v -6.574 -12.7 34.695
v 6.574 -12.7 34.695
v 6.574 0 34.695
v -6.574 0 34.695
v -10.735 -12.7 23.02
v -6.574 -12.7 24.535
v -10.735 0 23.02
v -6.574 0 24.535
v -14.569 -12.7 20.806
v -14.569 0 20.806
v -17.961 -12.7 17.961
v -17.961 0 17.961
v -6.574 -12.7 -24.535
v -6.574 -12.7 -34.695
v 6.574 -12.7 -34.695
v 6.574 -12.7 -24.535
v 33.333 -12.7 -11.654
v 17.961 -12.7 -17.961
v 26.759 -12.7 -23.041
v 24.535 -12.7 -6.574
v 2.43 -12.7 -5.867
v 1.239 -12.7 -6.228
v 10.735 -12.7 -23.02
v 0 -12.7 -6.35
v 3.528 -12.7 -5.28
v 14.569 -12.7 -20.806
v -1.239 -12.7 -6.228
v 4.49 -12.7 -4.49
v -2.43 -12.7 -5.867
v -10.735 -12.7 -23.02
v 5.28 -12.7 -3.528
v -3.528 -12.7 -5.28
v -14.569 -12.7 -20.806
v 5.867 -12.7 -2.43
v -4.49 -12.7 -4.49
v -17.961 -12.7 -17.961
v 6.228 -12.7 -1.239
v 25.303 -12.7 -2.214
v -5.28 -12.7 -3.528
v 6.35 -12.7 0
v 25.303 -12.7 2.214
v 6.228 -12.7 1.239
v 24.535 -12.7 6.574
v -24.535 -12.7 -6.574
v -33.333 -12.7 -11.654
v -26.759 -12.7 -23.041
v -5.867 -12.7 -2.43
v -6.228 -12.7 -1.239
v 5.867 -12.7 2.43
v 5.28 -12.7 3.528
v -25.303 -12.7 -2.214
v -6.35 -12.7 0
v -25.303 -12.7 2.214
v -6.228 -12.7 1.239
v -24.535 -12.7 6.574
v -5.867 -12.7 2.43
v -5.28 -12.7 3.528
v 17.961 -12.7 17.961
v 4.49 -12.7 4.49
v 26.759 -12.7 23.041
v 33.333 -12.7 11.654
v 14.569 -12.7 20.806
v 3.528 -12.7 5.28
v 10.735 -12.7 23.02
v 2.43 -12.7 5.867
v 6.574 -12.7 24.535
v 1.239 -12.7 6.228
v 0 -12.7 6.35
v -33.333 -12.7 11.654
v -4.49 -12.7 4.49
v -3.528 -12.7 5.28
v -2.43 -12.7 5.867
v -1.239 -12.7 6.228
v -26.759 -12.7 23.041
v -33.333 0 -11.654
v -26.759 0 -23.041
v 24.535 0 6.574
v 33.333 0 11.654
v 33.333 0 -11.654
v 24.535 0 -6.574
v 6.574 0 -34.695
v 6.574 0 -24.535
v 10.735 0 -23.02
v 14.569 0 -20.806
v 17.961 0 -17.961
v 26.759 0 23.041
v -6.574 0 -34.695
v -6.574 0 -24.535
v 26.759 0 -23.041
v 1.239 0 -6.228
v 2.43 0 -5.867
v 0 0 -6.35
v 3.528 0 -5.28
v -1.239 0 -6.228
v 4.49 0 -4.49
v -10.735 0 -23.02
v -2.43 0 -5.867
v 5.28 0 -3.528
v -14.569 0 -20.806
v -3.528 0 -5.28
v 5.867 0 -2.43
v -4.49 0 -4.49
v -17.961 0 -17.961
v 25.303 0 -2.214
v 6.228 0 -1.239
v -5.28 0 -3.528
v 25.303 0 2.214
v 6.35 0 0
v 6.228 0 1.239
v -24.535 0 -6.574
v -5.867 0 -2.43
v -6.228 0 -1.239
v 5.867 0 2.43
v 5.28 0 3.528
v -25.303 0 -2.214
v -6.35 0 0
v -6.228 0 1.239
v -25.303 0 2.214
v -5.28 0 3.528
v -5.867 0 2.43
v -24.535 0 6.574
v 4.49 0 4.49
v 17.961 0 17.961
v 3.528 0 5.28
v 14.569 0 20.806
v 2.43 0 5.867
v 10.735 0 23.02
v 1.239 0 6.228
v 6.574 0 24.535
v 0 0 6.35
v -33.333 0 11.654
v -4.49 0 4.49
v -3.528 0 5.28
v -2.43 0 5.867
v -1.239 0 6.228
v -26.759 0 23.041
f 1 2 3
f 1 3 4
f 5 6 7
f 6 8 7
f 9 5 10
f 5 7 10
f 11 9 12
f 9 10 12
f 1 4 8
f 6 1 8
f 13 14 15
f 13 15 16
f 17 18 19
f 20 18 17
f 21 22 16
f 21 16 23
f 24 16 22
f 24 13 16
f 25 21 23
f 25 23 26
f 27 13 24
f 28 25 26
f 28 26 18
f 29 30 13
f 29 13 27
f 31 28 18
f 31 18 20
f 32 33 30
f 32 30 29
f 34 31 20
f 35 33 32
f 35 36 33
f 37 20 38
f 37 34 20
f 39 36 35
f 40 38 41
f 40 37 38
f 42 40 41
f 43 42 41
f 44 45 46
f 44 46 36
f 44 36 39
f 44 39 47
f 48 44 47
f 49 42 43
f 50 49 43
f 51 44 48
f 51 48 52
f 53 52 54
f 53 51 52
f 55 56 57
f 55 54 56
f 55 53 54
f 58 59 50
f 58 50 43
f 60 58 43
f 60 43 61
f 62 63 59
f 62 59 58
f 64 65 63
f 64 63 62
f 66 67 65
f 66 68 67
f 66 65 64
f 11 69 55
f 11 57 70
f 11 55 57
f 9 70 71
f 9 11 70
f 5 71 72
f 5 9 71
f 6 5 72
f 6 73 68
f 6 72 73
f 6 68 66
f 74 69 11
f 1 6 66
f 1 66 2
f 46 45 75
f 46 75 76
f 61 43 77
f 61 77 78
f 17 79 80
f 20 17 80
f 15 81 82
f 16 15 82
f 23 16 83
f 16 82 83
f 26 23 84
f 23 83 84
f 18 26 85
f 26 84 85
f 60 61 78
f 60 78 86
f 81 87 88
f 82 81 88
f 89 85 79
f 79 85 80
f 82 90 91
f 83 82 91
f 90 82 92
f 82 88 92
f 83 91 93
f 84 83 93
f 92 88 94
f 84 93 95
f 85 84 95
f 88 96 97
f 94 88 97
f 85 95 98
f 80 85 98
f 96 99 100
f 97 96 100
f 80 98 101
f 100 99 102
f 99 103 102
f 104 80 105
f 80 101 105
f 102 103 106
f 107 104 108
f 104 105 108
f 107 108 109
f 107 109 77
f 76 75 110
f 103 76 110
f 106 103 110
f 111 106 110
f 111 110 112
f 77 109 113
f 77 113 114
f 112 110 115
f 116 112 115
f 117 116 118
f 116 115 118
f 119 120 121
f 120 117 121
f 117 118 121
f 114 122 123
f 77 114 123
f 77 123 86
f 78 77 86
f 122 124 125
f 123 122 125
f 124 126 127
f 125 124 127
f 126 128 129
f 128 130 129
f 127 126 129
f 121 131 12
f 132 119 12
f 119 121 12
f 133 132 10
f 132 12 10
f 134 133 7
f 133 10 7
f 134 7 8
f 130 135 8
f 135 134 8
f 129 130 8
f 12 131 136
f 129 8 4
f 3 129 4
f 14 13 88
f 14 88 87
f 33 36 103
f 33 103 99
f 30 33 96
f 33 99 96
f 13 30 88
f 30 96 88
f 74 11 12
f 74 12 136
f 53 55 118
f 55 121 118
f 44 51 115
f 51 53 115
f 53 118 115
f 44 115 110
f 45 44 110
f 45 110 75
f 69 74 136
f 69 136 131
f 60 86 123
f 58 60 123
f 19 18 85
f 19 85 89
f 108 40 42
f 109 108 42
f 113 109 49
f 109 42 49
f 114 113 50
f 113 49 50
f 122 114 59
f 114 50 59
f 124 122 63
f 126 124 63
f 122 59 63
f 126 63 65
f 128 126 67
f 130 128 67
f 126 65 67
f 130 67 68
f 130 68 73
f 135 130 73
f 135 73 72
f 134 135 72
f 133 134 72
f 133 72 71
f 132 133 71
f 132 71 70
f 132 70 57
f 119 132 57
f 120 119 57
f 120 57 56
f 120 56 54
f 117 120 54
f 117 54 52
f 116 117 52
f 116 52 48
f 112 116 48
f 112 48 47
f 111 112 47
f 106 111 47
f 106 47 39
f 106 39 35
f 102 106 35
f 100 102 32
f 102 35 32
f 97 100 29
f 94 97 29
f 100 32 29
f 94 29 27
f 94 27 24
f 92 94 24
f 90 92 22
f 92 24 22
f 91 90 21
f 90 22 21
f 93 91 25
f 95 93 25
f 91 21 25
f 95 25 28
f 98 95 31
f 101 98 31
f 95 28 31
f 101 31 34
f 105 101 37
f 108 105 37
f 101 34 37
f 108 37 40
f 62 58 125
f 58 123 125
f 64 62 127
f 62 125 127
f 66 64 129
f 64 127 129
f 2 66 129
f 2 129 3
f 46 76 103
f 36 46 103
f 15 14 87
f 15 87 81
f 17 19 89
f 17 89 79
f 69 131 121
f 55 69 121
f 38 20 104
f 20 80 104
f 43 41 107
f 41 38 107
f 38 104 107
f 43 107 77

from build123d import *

# Parameters (mm, degrees)
F0_R     = 25.4
F1_DEPTH = 12.7
F3_DEPTH = 12.7
F5_DEPTH = 12.7
F6_COUNT = 6
F7_R     = 6.35
F8_DEPTH = 25.4


with BuildPart() as f1:
    # F0 (on Front) → F1 (new body)
    with BuildSketch(Plane.XZ):
        Circle(F0_R)
    extrude(amount=F1_DEPTH)

    # F2 (on face) → F3 (join)
    with BuildSketch(Plane.XZ.offset(12.7)):
        Polygon((-6.574004, 24.534516), (0, 0), (0, 24.534516), align=None)
        Polygon((0, 24.534516), (0, 0), (6.574004, 24.534516), align=None)
        Polygon((-6.574004, 24.534516), (0, 24.534516), (6.574004, 24.534516), (6.574004, 34.694515), (-6.574004, 34.694515), align=None)
    extrude(amount=-F3_DEPTH)

    # F2 (on face) → F5 (join)
    with BuildSketch(Plane.XZ.offset(12.7)):
        Polygon((-6.574004, 24.534516), (0, 0), (0, 24.534516), align=None)
        Polygon((0, 24.534516), (0, 0), (6.574004, 24.534516), align=None)
        Polygon((-6.574004, 24.534516), (0, 24.534516), (6.574004, 24.534516), (6.574004, 34.694515), (-6.574004, 34.694515), align=None)
    extrude(amount=-F5_DEPTH)

    # F6: F1 ×6 about axis
    f6_axis = Axis((0, -33.893697, 0), (0, 1, 0))


with BuildPart() as f1_1:
    add(f1.part)
    for i in range(1, F6_COUNT):
        add(f1.part.rotate(f6_axis, i * 360 / F6_COUNT))

    # F7 (on face) → F8 (cut)
    with BuildSketch(Plane.XZ.offset(12.7)):
        Circle(F7_R)
    extrude(amount=-F8_DEPTH, mode=Mode.SUBTRACT)


solid = f1_1.part
